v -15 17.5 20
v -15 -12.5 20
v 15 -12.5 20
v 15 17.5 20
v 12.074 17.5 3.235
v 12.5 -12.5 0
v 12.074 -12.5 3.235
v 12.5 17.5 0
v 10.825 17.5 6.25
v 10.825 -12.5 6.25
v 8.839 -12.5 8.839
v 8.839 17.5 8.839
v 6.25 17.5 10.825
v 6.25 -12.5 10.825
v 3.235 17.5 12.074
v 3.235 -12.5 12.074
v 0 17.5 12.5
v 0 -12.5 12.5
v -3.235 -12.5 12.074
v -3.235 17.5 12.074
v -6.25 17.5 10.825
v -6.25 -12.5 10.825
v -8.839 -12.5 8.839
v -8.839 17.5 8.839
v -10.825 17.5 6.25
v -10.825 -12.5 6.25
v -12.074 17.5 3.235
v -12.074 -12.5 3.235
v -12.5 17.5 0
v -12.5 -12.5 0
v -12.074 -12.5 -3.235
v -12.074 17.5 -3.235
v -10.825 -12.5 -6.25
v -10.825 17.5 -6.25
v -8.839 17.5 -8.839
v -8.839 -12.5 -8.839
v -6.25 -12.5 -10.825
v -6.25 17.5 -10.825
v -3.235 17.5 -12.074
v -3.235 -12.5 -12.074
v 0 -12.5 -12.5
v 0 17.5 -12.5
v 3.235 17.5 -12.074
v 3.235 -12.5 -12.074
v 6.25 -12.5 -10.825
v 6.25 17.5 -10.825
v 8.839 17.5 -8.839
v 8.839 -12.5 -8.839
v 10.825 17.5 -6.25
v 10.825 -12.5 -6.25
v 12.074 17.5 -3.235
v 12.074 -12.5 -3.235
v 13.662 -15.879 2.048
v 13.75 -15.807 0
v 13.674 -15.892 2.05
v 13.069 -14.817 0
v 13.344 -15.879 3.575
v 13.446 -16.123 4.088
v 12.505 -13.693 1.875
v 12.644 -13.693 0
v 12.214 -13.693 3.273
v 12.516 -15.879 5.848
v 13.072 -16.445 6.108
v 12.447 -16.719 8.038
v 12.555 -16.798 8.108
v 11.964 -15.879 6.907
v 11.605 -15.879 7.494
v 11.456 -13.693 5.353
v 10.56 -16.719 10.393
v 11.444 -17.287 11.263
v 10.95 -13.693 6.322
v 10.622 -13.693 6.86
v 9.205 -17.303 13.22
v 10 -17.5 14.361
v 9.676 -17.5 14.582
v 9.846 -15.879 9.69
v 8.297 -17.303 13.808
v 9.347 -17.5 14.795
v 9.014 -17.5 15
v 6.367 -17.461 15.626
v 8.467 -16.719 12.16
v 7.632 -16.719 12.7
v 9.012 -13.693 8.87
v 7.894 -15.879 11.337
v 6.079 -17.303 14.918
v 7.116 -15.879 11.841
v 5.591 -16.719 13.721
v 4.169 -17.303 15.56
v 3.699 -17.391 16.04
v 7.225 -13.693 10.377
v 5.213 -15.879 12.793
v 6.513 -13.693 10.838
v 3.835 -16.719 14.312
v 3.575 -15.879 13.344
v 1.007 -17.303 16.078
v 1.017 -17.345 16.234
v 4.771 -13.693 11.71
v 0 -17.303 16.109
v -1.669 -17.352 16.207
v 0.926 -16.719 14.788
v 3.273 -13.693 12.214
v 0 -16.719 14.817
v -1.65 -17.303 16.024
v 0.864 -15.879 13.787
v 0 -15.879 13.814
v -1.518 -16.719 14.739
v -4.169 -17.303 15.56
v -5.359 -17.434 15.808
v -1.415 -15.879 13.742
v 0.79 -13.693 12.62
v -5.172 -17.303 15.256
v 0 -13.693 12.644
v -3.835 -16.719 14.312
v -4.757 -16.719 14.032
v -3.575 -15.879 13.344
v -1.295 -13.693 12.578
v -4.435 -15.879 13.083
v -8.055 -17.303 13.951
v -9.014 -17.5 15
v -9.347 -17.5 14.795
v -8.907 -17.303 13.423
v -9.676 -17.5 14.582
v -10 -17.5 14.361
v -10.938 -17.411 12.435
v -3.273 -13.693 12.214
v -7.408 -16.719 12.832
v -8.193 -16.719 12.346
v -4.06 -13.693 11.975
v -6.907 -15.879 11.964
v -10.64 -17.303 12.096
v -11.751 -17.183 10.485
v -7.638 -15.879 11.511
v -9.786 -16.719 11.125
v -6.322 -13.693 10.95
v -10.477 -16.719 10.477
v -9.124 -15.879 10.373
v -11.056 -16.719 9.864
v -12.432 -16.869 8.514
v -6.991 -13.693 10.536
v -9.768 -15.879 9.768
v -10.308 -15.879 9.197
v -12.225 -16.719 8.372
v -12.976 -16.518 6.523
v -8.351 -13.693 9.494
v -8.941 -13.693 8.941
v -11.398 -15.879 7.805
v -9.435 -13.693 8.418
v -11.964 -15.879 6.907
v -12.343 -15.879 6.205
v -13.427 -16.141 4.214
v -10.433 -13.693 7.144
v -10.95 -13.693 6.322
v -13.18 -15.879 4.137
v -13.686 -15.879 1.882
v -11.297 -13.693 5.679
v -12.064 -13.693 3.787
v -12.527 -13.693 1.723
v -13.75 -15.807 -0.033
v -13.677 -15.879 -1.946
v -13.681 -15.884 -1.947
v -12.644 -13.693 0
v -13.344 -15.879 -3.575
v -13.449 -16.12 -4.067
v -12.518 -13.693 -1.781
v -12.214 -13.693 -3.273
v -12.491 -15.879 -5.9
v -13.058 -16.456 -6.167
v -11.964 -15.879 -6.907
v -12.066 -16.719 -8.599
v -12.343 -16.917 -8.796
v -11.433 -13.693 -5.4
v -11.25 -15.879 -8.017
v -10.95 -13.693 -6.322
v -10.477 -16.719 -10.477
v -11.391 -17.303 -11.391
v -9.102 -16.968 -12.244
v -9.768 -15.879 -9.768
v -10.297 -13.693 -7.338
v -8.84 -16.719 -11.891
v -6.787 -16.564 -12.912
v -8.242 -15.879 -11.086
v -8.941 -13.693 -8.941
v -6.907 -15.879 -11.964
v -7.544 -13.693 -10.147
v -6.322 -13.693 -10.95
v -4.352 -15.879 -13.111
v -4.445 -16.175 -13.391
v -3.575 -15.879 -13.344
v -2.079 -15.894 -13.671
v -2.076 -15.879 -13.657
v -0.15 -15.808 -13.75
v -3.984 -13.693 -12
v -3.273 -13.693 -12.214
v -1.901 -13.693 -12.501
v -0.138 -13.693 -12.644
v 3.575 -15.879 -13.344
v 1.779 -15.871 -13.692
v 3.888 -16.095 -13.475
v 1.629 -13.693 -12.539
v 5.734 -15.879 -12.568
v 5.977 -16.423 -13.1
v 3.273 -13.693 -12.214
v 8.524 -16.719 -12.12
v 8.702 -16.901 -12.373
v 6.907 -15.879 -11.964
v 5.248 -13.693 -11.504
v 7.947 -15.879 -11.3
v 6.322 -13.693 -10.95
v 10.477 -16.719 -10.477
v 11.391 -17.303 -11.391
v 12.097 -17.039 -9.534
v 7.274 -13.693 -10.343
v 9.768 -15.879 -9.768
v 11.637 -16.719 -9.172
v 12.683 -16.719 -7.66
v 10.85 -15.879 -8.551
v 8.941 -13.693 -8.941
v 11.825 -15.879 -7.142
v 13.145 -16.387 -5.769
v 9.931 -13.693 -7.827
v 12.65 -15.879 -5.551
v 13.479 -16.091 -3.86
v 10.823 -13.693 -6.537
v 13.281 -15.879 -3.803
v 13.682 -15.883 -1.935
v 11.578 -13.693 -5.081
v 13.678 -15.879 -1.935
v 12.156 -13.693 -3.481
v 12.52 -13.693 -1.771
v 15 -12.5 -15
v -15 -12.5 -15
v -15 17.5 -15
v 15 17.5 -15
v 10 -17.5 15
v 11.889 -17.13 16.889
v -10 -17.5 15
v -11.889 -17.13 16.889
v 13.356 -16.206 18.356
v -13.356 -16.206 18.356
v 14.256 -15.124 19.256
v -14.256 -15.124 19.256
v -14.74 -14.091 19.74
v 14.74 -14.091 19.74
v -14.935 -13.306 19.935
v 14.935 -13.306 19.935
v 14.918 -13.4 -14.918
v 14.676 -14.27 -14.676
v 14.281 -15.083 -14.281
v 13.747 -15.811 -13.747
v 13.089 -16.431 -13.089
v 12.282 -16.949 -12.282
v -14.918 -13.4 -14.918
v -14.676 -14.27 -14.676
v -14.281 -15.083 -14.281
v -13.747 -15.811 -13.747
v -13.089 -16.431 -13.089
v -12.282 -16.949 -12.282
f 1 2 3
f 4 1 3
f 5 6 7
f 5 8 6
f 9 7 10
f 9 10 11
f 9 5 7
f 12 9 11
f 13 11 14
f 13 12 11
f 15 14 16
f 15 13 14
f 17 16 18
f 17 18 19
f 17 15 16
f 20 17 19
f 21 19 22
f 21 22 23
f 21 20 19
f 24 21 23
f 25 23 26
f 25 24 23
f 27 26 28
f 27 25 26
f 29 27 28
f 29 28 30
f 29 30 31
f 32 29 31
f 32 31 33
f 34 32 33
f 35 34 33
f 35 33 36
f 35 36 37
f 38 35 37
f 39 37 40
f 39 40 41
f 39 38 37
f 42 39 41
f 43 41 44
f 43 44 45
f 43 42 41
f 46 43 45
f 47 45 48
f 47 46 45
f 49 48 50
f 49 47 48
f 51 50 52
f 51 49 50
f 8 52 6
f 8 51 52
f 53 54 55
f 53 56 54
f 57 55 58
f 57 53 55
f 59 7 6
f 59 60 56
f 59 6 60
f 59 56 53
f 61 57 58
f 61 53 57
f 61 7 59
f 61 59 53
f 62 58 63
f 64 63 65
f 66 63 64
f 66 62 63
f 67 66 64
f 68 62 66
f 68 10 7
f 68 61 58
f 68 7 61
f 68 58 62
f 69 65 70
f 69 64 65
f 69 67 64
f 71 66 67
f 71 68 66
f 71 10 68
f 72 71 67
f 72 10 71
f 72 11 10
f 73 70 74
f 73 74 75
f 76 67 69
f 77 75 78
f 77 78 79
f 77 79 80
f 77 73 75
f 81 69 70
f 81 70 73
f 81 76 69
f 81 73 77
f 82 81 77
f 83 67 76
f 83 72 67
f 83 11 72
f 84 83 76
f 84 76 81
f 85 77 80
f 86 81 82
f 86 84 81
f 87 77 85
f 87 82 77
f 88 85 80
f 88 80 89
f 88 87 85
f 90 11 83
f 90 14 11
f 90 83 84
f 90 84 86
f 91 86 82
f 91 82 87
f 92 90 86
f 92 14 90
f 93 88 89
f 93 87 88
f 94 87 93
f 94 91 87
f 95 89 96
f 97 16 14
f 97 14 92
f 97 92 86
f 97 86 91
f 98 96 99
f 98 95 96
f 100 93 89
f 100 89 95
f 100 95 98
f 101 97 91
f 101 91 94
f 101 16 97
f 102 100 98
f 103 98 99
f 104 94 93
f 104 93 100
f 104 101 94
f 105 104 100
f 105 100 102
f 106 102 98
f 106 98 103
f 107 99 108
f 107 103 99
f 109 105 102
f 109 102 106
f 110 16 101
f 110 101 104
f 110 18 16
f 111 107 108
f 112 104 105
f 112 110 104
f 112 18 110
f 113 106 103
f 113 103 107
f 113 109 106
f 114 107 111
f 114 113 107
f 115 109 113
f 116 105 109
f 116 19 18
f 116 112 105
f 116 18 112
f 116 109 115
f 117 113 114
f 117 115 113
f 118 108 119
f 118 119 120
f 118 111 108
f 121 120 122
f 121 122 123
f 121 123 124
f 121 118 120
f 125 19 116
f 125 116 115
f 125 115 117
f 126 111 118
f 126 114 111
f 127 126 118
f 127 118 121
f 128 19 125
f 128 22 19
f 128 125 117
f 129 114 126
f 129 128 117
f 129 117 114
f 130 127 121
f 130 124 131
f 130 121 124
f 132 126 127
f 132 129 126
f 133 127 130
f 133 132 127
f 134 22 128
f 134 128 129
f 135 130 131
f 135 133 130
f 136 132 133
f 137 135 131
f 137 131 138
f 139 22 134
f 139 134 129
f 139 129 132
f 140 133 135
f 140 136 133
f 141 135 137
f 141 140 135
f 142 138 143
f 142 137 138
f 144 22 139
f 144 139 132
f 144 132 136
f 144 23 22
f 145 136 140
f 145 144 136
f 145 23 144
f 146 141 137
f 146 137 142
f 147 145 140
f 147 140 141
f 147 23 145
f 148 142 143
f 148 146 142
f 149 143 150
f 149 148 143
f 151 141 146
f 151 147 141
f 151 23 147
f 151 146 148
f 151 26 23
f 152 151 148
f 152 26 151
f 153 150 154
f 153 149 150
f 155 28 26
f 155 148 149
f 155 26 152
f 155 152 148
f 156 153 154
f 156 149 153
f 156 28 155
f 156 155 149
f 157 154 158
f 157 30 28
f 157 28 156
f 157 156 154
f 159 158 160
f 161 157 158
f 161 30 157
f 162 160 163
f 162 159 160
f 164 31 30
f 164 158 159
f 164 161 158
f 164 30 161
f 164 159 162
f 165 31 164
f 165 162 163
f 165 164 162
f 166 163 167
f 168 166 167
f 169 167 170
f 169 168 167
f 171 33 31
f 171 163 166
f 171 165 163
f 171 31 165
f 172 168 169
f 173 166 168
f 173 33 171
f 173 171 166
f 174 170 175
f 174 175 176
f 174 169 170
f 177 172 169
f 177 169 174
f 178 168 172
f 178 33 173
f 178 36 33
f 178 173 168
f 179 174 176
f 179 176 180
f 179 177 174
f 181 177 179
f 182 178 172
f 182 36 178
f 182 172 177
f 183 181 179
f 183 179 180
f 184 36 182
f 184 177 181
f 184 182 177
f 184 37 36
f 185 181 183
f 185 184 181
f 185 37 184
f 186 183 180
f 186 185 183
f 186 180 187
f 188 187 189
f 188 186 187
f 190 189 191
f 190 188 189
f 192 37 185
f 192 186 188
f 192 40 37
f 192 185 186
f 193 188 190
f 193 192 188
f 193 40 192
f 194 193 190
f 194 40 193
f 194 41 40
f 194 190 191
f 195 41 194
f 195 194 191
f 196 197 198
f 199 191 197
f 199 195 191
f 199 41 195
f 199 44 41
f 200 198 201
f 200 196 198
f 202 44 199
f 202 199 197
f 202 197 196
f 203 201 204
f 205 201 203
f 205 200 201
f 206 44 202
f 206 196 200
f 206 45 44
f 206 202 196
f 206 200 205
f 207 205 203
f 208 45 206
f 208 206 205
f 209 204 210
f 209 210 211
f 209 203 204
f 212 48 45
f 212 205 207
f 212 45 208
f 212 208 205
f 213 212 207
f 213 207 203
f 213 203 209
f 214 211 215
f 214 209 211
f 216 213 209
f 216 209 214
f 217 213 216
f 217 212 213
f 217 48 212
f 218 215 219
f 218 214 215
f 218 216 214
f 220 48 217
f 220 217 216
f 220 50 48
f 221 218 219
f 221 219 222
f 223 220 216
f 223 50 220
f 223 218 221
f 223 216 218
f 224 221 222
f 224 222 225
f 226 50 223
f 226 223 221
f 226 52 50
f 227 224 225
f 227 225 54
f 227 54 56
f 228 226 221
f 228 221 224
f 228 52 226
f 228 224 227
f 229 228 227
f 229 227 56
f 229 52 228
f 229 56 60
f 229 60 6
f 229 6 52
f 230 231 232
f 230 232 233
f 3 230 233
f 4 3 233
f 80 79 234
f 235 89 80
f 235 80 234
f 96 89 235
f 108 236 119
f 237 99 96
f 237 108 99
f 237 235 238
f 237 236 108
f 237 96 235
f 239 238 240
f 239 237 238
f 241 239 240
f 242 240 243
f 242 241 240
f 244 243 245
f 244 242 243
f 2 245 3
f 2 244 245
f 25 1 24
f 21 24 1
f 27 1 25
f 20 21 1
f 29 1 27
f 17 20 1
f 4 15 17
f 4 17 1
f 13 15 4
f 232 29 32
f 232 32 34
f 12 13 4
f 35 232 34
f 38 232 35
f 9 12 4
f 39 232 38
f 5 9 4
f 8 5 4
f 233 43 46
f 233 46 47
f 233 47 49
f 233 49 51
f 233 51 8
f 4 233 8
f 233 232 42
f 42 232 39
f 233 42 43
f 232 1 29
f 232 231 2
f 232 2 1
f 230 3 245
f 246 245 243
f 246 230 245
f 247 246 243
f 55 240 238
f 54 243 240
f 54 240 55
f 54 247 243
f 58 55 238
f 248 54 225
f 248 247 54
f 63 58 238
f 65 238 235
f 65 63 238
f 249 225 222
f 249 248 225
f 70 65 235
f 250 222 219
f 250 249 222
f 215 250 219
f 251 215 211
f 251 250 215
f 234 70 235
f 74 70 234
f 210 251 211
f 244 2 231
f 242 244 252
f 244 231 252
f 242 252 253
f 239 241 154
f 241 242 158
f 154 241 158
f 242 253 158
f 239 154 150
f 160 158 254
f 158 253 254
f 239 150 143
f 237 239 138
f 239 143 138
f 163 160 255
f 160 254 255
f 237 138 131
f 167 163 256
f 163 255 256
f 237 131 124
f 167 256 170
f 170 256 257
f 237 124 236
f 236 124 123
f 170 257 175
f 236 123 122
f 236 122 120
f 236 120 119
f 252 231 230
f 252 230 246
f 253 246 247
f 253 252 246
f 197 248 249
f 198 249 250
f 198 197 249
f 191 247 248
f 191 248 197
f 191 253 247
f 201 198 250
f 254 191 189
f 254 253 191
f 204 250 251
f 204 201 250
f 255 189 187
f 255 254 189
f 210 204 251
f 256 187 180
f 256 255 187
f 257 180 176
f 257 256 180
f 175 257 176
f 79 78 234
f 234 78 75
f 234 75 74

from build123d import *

# Parameters (mm, degrees)
F0_W        = 30
F0_H        = 30
F0_R        = 12.5
F1_DEPTH    = 17.5
F2_DEPTH    = 5
F3_T1_DEPTH = 55
F3_T3_DEPTH = 60


# Not quite as in the source:
# - a fillet or chamfer that OpenCascade refuses, or shapes differently, is made with other operations: its cross-section is extruded or revolved along the edge and cut away or added


with BuildPart() as f1:
    # F0 (on Front) → F1 (new body, symmetric)
    with BuildSketch(Plane.XZ):
        Rectangle(F0_W, F0_H)
        Circle(F0_R, mode=Mode.SUBTRACT)
    extrude(amount=F1_DEPTH, both=True)

    # F2 (add): a face of the model
    f2_faces = [f1.faces().sort_by_distance(p)[0] for p in [
        (0, 0, 15),
    ]]
    extrude(f2_faces, amount=F2_DEPTH)

    # F3: fillet of radius 5 on 5 edges, made by hand

    # F3_s2 → F3_t1 (cut)
    with BuildSketch(Plane.YZ.offset(-27.5)):
        with BuildLine():
            ThreePointArc((-12.5, -15), (-16.0355339059, -13.5355339059), (-17.5, -10))
            Line((-17.5, -10), (-17.5, -15))
            Line((-17.5, -15), (-12.5, -15))
        make_face()
        with BuildLine():
            ThreePointArc((-17.5, 15), (-16.0355339059, 18.5355339059), (-12.5, 20))
            Line((-12.5, 20), (-17.5, 20))
            Line((-17.5, 20), (-17.5, 15))
        make_face()
    extrude(amount=F3_T1_DEPTH, mode=Mode.SUBTRACT)

    # F3_s4 → F3_t3 (cut)
    with BuildSketch(Plane.XY.offset(-27.5)):
        with BuildLine():
            ThreePointArc((15, -12.5), (13.5355339059, -16.0355339059), (10, -17.5))
            Line((10, -17.5), (15, -17.5))
            Line((15, -17.5), (15, -12.5))
        make_face()
        with BuildLine():
            ThreePointArc((-15, -12.5), (-13.5355339059, -16.0355339059), (-10, -17.5))
            Line((-10, -17.5), (-15, -17.5))
            Line((-15, -17.5), (-15, -12.5))
        make_face()
    extrude(amount=F3_T3_DEPTH, mode=Mode.SUBTRACT)

    # F3_s5 → F3_t6 (revolve, cut)
    with BuildSketch(Plane.XY):
        with BuildLine():
            ThreePointArc((17.5, -17.5), (13.9644660941, -16.0355339059), (12.5, -12.5))
            Line((12.5, -12.5), (12.5, -17.5))
            Line((12.5, -17.5), (17.5, -17.5))
        make_face()
    revolve(axis=Axis((0, -17.5, 0), (0, -1, 0)), mode=Mode.SUBTRACT)


solid = f1.part
